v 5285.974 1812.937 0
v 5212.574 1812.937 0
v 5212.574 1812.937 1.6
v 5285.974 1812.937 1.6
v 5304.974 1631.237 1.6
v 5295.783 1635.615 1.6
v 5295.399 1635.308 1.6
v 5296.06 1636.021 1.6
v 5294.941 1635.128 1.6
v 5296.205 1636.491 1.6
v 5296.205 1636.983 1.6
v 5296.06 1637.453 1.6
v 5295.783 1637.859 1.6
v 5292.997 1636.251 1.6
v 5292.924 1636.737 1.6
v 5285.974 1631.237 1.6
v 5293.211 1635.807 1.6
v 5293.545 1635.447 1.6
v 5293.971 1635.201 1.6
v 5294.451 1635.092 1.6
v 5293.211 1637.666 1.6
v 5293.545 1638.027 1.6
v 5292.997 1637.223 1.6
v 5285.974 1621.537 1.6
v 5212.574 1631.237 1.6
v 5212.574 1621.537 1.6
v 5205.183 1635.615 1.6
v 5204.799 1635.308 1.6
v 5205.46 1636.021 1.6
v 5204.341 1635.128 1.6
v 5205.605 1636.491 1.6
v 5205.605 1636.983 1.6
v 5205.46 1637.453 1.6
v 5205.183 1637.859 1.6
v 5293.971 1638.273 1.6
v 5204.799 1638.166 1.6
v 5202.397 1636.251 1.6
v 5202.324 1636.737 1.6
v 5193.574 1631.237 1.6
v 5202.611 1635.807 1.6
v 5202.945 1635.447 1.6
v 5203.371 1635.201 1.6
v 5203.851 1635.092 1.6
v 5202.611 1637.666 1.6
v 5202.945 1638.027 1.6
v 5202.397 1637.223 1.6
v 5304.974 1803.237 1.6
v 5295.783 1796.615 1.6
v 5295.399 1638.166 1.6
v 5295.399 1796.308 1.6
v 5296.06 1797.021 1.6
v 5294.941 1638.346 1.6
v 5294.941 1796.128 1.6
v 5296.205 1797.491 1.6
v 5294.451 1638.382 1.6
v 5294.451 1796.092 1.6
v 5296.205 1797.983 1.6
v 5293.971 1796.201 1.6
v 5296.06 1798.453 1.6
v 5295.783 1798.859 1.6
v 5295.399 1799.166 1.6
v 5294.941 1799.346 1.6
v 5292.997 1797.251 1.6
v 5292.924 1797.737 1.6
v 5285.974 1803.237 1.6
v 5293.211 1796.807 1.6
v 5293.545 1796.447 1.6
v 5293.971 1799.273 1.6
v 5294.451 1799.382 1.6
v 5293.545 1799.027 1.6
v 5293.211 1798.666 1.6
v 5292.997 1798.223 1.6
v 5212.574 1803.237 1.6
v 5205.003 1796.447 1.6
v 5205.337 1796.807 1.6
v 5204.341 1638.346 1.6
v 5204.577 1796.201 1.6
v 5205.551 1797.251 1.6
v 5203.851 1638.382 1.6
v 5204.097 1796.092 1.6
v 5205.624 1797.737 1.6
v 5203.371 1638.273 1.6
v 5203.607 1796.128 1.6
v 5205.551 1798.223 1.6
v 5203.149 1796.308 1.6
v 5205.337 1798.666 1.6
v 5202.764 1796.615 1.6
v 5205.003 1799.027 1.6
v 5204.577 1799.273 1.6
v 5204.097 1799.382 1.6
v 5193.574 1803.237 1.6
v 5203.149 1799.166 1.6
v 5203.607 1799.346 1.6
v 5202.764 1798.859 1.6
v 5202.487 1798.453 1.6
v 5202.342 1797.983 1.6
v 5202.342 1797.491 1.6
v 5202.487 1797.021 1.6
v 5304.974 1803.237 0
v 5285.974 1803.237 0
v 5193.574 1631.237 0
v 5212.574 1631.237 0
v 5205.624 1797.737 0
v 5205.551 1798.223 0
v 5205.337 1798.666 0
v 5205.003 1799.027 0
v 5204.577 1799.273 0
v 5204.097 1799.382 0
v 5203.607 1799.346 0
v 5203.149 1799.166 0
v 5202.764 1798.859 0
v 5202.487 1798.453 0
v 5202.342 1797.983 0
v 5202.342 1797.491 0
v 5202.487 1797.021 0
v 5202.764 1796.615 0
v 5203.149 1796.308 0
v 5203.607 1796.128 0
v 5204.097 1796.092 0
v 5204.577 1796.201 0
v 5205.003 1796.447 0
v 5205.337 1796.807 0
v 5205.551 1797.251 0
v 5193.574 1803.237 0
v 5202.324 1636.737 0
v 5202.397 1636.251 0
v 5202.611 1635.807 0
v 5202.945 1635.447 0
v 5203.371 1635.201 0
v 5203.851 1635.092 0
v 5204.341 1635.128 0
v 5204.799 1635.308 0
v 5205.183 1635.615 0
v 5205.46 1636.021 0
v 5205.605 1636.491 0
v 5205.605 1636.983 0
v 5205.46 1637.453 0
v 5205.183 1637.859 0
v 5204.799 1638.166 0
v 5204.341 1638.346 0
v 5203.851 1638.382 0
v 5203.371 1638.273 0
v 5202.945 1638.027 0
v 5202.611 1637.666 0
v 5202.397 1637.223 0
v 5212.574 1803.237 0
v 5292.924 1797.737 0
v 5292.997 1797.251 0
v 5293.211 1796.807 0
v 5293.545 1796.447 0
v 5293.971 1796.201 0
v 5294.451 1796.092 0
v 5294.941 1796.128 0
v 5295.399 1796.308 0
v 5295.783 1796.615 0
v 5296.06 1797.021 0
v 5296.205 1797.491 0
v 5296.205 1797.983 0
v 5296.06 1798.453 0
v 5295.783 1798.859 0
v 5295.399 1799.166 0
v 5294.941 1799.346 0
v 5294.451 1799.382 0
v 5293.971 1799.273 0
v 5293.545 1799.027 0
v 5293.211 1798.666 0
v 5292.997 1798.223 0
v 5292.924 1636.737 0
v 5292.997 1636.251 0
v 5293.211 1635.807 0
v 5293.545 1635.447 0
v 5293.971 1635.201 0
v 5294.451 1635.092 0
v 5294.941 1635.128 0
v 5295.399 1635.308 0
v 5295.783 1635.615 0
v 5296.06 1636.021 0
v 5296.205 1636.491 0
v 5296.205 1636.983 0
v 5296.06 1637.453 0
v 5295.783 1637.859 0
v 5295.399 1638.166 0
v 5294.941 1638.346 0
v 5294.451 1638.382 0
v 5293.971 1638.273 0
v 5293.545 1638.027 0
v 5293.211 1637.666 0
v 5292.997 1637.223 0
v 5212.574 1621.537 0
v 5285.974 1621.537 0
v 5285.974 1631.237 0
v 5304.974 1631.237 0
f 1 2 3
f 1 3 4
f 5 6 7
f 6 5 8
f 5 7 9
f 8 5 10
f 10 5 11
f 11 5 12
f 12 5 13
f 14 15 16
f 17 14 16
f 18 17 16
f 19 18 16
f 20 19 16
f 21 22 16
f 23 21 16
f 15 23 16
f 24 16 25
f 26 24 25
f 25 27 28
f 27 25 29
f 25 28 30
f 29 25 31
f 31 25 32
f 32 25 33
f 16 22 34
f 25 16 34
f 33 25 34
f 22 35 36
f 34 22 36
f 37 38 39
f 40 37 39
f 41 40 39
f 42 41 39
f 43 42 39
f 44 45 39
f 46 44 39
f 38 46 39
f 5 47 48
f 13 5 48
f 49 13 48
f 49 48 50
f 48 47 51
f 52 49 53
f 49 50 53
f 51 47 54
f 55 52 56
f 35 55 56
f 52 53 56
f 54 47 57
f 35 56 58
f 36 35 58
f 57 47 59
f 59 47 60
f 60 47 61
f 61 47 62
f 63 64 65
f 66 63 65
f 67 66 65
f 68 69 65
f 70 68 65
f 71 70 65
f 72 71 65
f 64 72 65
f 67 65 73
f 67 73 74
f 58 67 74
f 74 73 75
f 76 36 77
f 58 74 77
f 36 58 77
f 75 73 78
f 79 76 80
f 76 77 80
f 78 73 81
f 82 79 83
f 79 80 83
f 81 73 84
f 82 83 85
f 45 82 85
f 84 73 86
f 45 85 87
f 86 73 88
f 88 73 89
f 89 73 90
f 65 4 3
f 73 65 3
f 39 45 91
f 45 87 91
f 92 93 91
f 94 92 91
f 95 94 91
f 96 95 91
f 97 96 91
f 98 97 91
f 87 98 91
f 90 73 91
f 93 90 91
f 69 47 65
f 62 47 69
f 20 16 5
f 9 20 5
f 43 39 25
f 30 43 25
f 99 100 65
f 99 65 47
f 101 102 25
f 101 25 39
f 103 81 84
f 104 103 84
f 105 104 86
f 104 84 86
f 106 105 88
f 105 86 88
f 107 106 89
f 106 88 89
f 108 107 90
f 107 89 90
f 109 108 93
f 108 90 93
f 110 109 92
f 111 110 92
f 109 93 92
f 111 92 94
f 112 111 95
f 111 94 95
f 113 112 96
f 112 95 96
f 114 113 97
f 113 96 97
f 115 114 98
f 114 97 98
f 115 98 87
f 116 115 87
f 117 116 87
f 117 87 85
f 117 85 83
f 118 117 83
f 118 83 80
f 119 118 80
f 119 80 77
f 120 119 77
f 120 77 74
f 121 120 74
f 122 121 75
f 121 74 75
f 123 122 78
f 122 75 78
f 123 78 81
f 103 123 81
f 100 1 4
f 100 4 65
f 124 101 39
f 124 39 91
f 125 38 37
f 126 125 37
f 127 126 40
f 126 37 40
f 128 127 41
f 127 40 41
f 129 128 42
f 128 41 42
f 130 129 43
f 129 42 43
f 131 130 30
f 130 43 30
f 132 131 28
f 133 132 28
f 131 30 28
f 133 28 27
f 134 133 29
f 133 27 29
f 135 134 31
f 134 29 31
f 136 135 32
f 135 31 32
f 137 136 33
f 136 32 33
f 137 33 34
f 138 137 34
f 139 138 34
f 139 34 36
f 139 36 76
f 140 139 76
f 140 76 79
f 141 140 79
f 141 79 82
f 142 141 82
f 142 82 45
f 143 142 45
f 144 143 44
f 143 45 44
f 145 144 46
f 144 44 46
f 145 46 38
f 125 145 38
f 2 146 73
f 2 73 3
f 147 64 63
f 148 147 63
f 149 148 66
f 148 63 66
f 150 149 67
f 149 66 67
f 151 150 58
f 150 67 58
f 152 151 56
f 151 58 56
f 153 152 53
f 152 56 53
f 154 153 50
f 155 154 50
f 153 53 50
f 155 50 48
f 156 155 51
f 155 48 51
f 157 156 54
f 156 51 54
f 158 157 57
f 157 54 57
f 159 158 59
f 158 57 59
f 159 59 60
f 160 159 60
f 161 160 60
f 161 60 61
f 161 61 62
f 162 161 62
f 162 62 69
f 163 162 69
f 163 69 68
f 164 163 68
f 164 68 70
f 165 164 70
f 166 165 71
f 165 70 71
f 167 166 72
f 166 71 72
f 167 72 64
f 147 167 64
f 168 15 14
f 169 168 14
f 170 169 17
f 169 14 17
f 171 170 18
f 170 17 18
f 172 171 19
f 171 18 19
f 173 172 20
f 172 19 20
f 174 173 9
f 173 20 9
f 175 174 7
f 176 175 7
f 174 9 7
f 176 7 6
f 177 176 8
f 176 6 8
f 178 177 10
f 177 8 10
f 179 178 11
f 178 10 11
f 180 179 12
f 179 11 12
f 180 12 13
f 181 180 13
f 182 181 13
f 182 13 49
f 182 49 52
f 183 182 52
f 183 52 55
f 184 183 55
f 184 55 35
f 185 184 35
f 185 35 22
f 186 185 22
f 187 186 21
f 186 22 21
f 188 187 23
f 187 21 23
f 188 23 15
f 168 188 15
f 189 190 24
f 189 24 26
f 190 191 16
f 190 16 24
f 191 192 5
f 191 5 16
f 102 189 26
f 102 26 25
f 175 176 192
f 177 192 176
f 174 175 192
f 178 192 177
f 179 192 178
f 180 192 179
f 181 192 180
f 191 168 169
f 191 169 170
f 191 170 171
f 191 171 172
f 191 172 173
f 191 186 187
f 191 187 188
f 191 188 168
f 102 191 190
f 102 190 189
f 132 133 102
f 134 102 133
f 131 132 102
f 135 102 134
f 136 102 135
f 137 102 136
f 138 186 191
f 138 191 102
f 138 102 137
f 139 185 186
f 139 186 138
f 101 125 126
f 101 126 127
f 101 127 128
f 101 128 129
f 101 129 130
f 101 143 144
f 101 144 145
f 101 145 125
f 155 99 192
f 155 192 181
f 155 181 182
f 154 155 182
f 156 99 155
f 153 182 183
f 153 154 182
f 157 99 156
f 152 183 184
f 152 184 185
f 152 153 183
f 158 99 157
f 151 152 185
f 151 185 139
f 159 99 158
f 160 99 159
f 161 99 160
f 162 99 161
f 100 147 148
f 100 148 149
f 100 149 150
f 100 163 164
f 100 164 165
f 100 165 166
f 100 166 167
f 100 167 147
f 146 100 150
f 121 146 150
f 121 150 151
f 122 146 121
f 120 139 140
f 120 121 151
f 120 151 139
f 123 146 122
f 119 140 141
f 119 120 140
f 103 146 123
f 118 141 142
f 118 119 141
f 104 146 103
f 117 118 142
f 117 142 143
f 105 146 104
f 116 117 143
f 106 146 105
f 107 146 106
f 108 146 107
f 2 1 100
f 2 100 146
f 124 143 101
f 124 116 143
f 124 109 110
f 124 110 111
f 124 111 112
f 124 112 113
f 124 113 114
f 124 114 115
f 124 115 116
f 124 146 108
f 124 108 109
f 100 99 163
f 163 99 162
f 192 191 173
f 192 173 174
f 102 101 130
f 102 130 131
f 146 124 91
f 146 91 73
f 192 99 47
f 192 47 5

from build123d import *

# Parameters (mm, degrees)
BOSS_EXTRUDE1_DEPTH = 1.6
CUT_EXTRUDE1_DEPTH  = 1.6


with BuildPart() as part:
    # Sketch2 → Boss-Extrude1 (new body)
    with BuildSketch(Plane.XY):
        Polygon((5193.573840828, 1803.237079941), (5212.573840828, 1803.237079941), (5212.573840828, 1812.937079941), (5285.973840828, 1812.937079941), (5285.973840828, 1803.237079941), (5304.973840828, 1803.237079941), (5304.973840828, 1631.237079941), (5285.973840828, 1631.237079941), (5285.973840828, 1621.537079941), (5212.573840828, 1621.537079941), (5212.573840828, 1631.237079941), (5193.573840828, 1631.237079941), align=None)
    extrude(amount=BOSS_EXTRUDE1_DEPTH)

    # Sketch3 → Cut-Extrude1 (cut)
    with BuildSketch(Plane.XY.offset(1.6)):
        with BuildLine():
            ThreePointArc((5202.323840828, 1797.736928772), (5203.973840828, 1796.086928772), (5205.623840828, 1797.736928772))
            ThreePointArc((5205.623840828, 1797.736928772), (5203.973840828, 1799.386928772), (5202.323840828, 1797.736928772))
        make_face()
        with BuildLine():
            ThreePointArc((5296.223840828, 1797.736928772), (5294.573840828, 1799.386928772), (5292.923840828, 1797.736928772))
            ThreePointArc((5292.923840828, 1797.736928772), (5294.573840828, 1796.086928772), (5296.223840828, 1797.736928772))
        make_face()
        with BuildLine():
            ThreePointArc((5296.223840828, 1636.736928772), (5294.573840828, 1638.386928772), (5292.923840828, 1636.736928772))
            ThreePointArc((5292.923840828, 1636.736928772), (5294.573840828, 1635.086928772), (5296.223840828, 1636.736928772))
        make_face()
        with BuildLine():
            ThreePointArc((5205.623840828, 1636.736928772), (5203.973840828, 1638.386928772), (5202.323840828, 1636.736928772))
            ThreePointArc((5202.323840828, 1636.736928772), (5203.973840828, 1635.086928772), (5205.623840828, 1636.736928772))
        make_face()
    extrude(amount=-CUT_EXTRUDE1_DEPTH, mode=Mode.SUBTRACT)


solid = part.part
